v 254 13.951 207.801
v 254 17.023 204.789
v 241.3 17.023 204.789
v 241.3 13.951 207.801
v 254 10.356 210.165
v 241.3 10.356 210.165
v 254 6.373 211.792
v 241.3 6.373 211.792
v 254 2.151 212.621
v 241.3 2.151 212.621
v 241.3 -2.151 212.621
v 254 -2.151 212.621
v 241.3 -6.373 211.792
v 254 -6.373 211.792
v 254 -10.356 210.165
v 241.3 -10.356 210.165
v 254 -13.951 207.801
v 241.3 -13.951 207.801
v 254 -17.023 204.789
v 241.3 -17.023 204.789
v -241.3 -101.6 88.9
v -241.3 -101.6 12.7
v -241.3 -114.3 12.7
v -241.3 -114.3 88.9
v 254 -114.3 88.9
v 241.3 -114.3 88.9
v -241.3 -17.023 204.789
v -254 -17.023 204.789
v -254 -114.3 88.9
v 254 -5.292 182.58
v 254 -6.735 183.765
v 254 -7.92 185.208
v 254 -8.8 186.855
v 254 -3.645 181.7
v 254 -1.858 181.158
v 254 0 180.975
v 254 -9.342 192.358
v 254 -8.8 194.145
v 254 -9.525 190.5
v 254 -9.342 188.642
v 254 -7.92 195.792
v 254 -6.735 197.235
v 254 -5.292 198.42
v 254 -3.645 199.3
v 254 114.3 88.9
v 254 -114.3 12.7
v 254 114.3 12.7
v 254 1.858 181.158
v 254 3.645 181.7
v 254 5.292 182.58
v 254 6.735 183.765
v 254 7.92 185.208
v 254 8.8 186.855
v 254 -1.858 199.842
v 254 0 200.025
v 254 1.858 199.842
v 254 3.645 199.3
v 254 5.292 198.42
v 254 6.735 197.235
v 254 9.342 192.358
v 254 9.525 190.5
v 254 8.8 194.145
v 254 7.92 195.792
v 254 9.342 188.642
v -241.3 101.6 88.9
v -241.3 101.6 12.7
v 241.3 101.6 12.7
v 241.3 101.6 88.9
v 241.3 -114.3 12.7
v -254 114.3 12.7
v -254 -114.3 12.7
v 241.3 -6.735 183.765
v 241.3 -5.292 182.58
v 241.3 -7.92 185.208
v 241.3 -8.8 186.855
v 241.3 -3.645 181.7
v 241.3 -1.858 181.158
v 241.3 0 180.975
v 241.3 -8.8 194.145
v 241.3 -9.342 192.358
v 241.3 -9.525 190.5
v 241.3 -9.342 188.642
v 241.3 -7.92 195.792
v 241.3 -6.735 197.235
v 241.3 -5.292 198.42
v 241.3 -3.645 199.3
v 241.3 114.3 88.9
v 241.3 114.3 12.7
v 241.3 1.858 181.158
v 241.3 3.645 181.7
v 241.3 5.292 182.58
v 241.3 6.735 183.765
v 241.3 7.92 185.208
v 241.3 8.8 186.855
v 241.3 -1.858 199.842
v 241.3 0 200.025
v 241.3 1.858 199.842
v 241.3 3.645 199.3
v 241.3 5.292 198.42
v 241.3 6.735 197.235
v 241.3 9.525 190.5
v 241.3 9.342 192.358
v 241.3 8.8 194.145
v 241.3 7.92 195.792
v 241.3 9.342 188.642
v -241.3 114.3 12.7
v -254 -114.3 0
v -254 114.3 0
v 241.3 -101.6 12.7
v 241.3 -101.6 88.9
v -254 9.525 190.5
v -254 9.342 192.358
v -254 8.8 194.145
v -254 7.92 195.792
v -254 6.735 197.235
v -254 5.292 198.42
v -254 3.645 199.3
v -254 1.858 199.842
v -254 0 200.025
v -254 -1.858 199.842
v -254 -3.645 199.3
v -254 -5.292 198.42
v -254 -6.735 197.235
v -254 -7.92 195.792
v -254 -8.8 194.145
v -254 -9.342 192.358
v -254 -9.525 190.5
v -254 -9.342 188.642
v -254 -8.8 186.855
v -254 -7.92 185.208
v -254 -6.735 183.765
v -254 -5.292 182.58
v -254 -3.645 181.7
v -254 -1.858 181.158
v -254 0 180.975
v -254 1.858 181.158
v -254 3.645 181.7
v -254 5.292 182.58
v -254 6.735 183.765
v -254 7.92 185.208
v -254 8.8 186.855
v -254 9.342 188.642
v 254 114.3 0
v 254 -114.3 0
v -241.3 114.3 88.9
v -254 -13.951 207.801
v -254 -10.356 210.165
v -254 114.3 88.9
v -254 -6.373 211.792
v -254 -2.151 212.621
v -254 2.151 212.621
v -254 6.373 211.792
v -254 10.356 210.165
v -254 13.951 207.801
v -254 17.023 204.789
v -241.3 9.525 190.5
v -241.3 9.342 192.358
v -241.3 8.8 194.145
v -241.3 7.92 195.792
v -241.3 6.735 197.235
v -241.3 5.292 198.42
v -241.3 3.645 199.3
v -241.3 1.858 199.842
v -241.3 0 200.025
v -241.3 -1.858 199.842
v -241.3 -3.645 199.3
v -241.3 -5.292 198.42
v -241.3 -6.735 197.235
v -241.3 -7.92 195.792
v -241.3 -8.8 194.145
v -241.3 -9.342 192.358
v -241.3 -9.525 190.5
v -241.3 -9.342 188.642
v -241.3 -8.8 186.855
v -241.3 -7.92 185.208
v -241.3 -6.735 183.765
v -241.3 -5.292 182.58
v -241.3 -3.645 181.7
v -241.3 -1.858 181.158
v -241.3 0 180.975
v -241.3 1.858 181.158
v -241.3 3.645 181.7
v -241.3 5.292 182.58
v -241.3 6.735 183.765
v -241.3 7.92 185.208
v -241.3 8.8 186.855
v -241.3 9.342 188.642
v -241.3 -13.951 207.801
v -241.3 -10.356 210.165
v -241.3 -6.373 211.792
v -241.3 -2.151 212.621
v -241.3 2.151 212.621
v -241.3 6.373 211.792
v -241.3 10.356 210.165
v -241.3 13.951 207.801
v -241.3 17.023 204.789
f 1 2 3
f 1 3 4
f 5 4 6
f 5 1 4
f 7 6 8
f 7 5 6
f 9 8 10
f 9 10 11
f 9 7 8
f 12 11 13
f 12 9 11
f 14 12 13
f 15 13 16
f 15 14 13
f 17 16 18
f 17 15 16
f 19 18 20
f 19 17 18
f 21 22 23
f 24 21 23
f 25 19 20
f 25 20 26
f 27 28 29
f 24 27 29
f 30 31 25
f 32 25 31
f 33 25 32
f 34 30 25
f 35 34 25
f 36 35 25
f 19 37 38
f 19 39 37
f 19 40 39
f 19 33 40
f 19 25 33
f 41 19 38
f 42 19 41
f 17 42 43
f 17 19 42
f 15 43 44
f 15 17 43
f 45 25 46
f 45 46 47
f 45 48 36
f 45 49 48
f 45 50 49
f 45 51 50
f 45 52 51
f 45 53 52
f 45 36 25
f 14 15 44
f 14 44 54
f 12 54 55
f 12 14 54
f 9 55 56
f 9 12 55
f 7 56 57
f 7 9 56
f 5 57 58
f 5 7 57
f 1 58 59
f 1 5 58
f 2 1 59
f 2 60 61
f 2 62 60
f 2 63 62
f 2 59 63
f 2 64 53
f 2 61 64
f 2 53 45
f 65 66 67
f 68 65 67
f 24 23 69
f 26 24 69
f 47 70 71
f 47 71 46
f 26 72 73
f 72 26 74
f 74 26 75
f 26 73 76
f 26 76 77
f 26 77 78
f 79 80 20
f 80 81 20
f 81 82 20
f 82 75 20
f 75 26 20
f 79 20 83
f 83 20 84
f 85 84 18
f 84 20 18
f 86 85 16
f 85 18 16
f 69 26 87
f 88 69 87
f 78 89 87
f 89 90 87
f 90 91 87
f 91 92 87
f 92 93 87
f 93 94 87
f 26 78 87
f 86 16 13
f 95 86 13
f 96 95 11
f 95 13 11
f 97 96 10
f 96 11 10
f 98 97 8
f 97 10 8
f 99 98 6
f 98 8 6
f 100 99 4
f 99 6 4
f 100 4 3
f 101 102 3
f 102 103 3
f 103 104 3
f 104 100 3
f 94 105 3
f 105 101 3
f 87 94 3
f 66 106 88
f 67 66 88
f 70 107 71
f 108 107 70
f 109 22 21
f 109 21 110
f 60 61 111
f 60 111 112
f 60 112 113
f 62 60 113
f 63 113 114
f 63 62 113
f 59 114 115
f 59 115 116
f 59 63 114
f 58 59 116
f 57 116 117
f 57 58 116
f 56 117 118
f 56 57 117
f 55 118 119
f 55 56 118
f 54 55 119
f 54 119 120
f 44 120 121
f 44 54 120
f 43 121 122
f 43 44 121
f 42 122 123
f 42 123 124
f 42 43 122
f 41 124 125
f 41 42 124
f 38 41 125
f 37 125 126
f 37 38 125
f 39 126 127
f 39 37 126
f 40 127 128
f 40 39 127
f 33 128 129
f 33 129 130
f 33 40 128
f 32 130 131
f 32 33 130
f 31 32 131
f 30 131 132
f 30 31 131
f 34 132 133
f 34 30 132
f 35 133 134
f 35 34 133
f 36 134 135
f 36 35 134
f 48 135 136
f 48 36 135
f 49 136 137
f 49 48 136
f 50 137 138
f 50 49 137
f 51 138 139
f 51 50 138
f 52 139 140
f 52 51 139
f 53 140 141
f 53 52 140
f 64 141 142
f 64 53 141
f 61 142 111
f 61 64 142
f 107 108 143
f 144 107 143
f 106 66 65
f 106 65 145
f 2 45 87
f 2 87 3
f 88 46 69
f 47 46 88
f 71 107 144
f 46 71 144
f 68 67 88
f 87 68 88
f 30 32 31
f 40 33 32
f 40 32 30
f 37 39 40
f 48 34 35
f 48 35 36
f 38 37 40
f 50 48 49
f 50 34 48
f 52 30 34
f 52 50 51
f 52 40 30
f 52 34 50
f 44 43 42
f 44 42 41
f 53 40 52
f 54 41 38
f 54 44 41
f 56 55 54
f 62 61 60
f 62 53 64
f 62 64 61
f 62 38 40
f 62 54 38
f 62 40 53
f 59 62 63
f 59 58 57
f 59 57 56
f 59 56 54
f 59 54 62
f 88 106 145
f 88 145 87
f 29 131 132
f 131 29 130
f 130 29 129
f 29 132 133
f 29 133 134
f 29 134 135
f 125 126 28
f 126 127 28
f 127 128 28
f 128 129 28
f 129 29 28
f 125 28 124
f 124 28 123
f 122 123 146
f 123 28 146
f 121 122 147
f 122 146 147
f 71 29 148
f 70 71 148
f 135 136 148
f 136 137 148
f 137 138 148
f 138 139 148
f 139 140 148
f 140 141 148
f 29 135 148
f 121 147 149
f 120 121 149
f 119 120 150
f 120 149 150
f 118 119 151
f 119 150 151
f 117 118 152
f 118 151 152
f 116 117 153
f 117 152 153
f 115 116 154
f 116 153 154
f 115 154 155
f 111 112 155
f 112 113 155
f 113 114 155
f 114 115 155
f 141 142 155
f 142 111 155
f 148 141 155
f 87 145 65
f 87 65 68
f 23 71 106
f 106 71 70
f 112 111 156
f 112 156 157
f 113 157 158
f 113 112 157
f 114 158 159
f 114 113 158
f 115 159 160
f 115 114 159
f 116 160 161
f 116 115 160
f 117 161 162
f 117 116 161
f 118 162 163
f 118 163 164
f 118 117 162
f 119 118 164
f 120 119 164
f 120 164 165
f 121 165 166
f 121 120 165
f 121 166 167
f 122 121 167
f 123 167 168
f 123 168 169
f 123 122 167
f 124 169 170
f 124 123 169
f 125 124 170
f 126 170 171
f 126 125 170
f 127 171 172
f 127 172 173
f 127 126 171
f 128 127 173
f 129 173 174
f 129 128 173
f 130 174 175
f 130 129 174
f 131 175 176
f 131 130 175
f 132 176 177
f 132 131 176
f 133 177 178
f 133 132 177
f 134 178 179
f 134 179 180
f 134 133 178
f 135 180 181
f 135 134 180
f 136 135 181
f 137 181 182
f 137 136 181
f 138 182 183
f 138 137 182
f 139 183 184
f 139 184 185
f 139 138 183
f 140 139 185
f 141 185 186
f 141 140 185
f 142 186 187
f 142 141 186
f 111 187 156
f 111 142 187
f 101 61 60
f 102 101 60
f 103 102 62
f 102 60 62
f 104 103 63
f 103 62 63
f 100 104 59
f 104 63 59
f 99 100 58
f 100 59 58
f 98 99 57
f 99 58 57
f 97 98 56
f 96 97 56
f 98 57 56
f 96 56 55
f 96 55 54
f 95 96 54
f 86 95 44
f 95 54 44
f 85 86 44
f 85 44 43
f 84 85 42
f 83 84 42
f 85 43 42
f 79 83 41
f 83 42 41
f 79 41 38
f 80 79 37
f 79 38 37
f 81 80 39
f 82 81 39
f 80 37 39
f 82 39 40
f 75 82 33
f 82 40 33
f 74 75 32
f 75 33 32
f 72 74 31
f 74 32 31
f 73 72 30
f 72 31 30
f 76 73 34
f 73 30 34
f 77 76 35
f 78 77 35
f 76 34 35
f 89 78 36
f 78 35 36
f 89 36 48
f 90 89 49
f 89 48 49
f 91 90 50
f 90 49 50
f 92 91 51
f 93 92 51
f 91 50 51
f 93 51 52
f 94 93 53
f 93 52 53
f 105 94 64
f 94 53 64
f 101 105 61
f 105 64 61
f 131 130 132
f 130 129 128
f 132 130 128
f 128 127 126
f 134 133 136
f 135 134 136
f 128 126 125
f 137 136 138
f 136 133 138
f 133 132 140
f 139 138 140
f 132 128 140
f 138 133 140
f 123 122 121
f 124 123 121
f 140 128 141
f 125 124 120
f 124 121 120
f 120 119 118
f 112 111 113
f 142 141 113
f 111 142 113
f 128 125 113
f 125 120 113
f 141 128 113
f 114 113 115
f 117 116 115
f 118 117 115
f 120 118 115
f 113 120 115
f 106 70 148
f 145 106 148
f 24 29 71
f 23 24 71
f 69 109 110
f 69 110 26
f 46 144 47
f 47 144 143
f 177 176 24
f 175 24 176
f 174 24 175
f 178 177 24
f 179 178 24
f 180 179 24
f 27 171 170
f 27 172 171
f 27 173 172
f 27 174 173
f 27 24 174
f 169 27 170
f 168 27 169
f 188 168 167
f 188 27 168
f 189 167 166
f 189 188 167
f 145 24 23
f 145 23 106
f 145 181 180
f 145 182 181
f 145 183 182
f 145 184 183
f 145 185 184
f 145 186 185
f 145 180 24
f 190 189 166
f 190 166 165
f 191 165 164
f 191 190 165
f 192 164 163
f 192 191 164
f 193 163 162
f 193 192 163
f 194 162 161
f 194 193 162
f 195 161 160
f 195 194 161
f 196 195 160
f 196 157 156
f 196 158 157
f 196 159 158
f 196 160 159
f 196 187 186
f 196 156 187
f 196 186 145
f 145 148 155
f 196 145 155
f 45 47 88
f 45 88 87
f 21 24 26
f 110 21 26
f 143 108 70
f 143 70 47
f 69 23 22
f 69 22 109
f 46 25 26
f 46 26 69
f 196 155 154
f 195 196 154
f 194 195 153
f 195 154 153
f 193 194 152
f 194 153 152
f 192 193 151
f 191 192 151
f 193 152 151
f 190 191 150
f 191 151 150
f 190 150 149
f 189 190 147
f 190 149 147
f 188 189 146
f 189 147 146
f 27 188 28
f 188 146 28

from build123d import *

# Parameters (mm, degrees)
F0_W     = 508
F0_H     = 228.6
F1_DEPTH = 12.7
F2_R     = 9.525
F3_DEPTH = 12.7
F5_W     = 482.6
F5_H     = 12.7
F6_DEPTH = 76.2
F8_DEPTH = 508


with BuildPart() as f1:
    # F0 (on Top) → F1 (new body)
    with BuildSketch(Plane.XY):
        Rectangle(F0_W, F0_H)
    extrude(amount=F1_DEPTH)


with BuildPart() as f3:
    # F2 (on face) → F3 (new body)
    with BuildSketch(Plane.YZ.offset(254)):
        with BuildLine():
            Line((-114.3, 88.9), (-114.3, 12.7))
            Line((-114.3, 12.7), (114.3, 12.7))
            Line((114.3, 12.7), (114.3, 88.9))
            Line((114.3, 88.9), (17.0228203773, 204.7889541745))
            ThreePointArc((17.0228203773, 204.7889541745), (0, 212.725), (-17.0228203773, 204.7889541745))
            Line((-17.0228203773, 204.7889541745), (-114.3, 88.9))
        make_face()
        with Locations((0, 190.5)):
            Circle(F2_R, mode=Mode.SUBTRACT)
    extrude(amount=-F3_DEPTH)


with BuildPart() as f4_1:
    # F4: instance of F3
    add(f3.part.mirror(Plane.YZ))


with BuildPart() as f6:
    # F5 (on face) → F6 (new body, through all)
    with BuildSketch(Plane.XY.offset(12.7)):
        with Locations((0, 107.95)):
            Rectangle(F5_W, F5_H)
    extrude(amount=F6_DEPTH)


with BuildPart() as f7_1:
    # F7: instance of F6
    add(f6.part.mirror(Plane.XZ))


with BuildPart() as f8:
    # F2 (on face) → F8 (new body, through all)
    with BuildSketch(Plane.YZ.offset(254)):
        with Locations((0, 190.5)):
            Circle(F2_R)
    extrude(amount=-F8_DEPTH)


solid = Compound([f1.part, f3.part, f4_1.part, f6.part, f7_1.part, f8.part])
